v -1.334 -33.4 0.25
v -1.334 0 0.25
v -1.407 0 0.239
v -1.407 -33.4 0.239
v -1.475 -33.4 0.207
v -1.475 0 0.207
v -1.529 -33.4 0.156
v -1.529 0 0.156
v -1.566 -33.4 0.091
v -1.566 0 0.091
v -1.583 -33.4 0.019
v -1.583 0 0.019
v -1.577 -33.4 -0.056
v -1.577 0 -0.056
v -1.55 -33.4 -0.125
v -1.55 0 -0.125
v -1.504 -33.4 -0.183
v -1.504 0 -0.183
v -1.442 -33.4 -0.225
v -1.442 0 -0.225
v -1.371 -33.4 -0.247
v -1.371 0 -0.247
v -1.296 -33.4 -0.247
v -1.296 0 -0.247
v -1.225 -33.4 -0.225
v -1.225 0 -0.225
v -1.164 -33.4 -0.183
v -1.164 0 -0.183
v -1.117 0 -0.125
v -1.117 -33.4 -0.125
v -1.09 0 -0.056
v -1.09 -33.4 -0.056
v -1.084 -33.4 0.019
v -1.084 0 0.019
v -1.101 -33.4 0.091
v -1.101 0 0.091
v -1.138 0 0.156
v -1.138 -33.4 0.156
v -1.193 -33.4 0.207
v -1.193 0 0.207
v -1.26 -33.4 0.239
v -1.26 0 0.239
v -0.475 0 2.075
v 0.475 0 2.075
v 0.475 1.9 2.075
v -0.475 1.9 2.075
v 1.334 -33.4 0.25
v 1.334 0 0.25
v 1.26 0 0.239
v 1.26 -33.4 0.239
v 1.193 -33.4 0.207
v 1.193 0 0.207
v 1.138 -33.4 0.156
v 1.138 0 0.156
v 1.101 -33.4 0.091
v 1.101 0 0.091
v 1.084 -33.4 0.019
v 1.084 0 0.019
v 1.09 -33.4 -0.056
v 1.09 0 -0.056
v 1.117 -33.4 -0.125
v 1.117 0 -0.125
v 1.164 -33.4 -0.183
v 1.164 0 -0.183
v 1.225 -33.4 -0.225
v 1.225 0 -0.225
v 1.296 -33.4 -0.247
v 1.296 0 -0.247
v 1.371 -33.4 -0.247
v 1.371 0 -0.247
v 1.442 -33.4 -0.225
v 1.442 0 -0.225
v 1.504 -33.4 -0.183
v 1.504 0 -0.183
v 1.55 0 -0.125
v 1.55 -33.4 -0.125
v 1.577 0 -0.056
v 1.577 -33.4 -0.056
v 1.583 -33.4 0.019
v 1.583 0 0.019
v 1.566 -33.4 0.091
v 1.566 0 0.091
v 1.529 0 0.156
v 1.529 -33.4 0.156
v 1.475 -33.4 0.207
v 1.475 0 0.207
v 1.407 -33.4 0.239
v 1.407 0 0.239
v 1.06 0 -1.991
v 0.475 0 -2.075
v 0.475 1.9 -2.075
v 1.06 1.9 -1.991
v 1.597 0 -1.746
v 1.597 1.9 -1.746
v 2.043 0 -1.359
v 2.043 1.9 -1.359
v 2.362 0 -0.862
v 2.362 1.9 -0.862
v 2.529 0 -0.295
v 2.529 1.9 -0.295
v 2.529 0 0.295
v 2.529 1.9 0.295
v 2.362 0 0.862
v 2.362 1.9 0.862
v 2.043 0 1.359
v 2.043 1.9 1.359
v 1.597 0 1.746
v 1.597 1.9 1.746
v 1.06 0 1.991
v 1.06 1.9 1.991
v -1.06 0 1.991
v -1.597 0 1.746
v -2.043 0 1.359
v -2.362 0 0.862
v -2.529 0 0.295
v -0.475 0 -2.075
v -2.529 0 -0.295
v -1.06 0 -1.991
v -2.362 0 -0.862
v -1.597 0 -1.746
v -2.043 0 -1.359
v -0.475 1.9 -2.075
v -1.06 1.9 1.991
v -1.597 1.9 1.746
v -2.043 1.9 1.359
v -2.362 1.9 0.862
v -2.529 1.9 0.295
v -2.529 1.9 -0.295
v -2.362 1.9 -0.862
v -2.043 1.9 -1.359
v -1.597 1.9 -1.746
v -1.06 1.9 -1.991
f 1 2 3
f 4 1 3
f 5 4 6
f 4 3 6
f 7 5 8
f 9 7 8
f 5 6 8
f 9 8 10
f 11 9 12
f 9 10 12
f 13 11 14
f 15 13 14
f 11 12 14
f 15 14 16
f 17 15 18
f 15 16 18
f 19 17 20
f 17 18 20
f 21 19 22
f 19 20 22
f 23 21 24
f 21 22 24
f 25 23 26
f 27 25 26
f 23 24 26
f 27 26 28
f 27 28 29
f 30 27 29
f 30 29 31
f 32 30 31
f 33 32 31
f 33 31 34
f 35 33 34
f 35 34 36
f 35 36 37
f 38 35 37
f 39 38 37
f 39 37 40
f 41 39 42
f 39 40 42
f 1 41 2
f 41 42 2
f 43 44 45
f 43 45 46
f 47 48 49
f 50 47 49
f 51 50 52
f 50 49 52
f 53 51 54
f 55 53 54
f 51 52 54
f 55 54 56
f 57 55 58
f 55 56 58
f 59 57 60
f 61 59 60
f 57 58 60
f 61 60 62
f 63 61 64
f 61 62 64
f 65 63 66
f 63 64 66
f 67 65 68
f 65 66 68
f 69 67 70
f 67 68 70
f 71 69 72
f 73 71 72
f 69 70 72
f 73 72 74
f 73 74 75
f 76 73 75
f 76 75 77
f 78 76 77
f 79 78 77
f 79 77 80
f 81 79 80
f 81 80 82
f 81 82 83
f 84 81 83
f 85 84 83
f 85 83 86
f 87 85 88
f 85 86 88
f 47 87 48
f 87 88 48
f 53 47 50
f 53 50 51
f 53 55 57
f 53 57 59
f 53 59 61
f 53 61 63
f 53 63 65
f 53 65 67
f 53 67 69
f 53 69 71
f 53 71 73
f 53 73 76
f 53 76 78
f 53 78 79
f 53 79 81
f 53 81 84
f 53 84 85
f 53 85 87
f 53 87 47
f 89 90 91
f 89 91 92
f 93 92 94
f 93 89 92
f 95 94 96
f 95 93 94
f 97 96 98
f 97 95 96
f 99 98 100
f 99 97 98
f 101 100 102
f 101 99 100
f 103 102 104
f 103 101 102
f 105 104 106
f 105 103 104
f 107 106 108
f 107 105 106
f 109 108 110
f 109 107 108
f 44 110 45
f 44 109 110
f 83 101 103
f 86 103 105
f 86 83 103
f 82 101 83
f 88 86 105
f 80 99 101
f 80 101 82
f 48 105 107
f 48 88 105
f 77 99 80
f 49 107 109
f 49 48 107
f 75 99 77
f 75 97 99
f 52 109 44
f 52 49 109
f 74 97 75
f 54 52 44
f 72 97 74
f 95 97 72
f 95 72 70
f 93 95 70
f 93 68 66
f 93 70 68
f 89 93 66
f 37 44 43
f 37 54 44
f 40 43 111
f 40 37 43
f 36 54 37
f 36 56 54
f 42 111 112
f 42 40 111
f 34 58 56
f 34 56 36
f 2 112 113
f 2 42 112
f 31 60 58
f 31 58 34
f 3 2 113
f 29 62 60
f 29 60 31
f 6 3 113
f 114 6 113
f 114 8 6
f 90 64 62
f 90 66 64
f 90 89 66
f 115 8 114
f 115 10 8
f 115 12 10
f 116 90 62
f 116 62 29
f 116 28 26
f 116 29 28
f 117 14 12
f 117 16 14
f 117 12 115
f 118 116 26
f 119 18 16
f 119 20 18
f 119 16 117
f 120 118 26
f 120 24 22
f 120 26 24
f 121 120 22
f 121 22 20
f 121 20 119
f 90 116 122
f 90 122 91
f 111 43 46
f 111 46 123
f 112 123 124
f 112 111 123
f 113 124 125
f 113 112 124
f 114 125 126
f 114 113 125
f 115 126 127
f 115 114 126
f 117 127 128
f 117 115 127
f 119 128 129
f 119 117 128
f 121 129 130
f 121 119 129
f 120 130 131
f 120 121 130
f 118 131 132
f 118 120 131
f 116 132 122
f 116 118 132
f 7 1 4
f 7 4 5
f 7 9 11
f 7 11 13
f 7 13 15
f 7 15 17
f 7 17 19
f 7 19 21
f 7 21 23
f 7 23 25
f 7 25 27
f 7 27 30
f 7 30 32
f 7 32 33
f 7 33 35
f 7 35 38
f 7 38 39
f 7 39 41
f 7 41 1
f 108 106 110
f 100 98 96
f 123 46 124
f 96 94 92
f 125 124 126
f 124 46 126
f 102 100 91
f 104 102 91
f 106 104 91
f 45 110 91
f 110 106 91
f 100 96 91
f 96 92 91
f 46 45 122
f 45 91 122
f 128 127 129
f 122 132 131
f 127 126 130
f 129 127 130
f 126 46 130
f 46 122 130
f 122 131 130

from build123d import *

# Parameters (mm, degrees)
SALIENTE_EXTRUIR1_DEPTH = 1.9
CROQUIS3_R              = 0.25
SALIENTE_EXTRUIR2_DEPTH = 33.4


with BuildPart() as part:
    # Croquis1 → Saliente-Extruir1 (new body)
    with BuildSketch(Plane(origin=(0, 0, 0), x_dir=(1, 0, 0), z_dir=(0, 1, 0))):
        with BuildLine():
            Line((-0.475, 2.075), (0.475, 2.075))
            ThreePointArc((0.475, 2.075), (2.55, 0), (0.475, -2.075))
            Line((0.475, -2.075), (-0.475, -2.075))
            ThreePointArc((-0.475, -2.075), (-2.55, 0), (-0.475, 2.075))
        make_face()
    extrude(amount=SALIENTE_EXTRUIR1_DEPTH)

    # Croquis3 → Saliente-Extruir2 (add)
    with BuildSketch(Plane.XZ):
        with Locations(Location((-1.333712644, 0, 0), (0, 0, 90))):
            Circle(CROQUIS3_R)
        with Locations(Location((1.333712644, 0, 0), (0, 0, 90))):
            Circle(CROQUIS3_R)
    extrude(amount=SALIENTE_EXTRUIR2_DEPTH)


solid = part.part
